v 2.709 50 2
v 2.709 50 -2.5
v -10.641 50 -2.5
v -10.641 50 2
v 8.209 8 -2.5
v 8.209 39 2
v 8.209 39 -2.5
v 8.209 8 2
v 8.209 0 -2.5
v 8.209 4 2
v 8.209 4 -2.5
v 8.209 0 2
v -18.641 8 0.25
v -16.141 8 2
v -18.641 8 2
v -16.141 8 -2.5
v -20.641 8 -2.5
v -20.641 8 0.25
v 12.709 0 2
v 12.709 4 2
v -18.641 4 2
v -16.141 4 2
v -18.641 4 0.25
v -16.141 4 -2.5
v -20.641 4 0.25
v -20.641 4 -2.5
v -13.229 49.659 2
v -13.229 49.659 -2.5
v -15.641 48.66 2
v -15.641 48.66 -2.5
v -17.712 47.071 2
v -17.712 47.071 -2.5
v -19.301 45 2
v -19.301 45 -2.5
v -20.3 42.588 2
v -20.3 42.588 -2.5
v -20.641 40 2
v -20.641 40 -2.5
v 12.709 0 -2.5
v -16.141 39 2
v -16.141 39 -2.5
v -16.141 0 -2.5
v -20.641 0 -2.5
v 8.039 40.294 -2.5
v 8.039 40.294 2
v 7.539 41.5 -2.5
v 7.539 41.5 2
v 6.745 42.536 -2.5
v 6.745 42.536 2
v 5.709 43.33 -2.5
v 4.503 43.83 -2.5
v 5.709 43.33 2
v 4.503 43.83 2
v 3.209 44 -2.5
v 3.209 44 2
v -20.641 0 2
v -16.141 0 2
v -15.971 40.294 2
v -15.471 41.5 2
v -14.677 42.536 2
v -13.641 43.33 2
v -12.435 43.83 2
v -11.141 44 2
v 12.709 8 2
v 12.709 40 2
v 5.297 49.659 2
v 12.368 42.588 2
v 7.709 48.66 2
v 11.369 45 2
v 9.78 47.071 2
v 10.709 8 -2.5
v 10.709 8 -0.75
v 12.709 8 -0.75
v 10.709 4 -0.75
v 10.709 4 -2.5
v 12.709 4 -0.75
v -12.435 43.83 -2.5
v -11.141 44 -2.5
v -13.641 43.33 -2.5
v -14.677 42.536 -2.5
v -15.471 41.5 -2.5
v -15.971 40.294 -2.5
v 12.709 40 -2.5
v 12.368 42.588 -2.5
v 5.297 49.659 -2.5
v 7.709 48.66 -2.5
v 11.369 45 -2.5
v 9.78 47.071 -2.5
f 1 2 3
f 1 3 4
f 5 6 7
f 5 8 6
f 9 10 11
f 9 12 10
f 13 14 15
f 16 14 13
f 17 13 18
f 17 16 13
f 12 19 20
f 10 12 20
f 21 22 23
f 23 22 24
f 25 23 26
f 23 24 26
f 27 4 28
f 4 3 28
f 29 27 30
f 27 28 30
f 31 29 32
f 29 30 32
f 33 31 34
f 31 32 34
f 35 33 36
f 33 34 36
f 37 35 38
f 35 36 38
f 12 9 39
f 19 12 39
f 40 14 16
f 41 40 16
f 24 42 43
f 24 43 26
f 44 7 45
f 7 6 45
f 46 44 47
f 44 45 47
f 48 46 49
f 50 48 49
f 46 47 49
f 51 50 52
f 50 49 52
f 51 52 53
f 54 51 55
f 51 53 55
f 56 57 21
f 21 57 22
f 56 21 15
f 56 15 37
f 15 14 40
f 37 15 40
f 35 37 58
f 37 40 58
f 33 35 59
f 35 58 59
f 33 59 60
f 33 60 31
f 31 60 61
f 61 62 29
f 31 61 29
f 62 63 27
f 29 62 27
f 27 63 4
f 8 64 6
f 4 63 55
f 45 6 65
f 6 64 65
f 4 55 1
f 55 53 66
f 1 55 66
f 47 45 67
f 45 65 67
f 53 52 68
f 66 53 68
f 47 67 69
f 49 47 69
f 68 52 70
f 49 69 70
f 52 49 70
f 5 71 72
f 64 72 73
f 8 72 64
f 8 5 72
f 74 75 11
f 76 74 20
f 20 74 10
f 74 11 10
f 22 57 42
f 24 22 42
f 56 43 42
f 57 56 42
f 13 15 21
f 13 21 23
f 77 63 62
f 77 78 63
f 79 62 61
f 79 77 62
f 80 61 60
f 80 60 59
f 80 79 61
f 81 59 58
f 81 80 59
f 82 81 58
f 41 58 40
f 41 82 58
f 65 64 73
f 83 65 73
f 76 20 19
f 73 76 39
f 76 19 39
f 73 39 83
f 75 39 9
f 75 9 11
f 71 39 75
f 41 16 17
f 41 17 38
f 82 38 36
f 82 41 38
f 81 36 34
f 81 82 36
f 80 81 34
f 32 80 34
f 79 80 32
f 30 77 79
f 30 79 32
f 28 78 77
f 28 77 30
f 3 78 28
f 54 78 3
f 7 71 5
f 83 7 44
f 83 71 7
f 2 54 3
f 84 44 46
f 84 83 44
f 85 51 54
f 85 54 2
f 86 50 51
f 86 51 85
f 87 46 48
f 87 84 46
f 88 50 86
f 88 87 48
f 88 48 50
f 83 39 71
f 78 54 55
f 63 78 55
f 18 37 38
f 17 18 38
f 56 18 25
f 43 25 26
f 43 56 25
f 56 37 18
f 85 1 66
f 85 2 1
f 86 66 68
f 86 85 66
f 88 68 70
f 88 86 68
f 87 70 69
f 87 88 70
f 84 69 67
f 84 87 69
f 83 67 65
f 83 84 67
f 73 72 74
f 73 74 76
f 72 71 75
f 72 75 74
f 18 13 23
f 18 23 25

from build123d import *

# Parameters (mm, degrees)
SKETCH1_W             = 4.5
SKETCH1_H             = 4.5
BOSS_EXTRUDE1_DEPTH   = 50
BOSS_EXTRUDE1_2_DEPTH = 50
SKETCH2_W             = 4.5
SKETCH2_H             = 6
BOSS_EXTRUDE2_DEPTH   = 25
FILLET1_R             = 10
FILLET2_R             = 5
SKETCH5_W             = 4.5
SKETCH5_H             = 4
CUT_EXTRUDE3_DEPTH    = 2.75
SKETCH6_W             = 4.5
SKETCH6_H             = 4
CUT_EXTRUDE4_DEPTH    = 2.75
SKETCH3_W             = 4.5
SKETCH3_H             = 4
CUT_EXTRUDE1_DEPTH    = 2.5
SKETCH4_W             = 4.5
SKETCH4_H             = 4
CUT_EXTRUDE2_DEPTH    = 2.5


with BuildPart() as part:
    # Sketch1 → Boss-Extrude1 (new body)
    with BuildSketch(Plane(origin=(0, 0, 0), x_dir=(1, 0, 0), z_dir=(0, 1, 0))):
        with Locations((-18.391025641, 0.25)):
            Rectangle(SKETCH1_W, SKETCH1_H)
    extrude(amount=BOSS_EXTRUDE1_DEPTH)



with BuildPart() as body_2:
    # Sketch1 → Boss-Extrude1 2 (new body)
    with BuildSketch(Plane(origin=(0, 0, 0), x_dir=(1, 0, 0), z_dir=(0, 1, 0))):
        with Locations((10.458974359, 0.25)):
            Rectangle(SKETCH1_W, SKETCH1_H)
    extrude(amount=BOSS_EXTRUDE1_2_DEPTH)


with BuildPart() as part_1:
    add(part.part)

    add(body_2.part)  # Boss-Extrude2 merges body 2
    # Sketch2 → Boss-Extrude2 (add)
    with BuildSketch(Plane.ZY.offset(-8.208974359)):
        with Locations((-0.25, 47)):
            Rectangle(SKETCH2_W, SKETCH2_H)
    extrude(amount=BOSS_EXTRUDE2_DEPTH)

    # Fillet1
    fillet1_edges = [part_1.edges().sort_by_distance(p)[0] for p in [
        (-20.641025641, 50, -0.25),
        (12.708974359, 50, -0.25),
    ]]
    fillet(fillet1_edges, radius=FILLET1_R)

    # Fillet2
    fillet2_edges = [part_1.edges().sort_by_distance(p)[0] for p in [
        (-16.141025641, 44, -0.25),
        (8.208974359, 44, -0.25),
    ]]
    fillet(fillet2_edges, radius=FILLET2_R)

    # Sketch5 → Cut-Extrude3 (cut)
    with BuildSketch(Plane.XY.offset(2)):
        with Locations((10.458974359, 6)):
            Rectangle(SKETCH5_W, SKETCH5_H)
    extrude(amount=-CUT_EXTRUDE3_DEPTH, mode=Mode.SUBTRACT)

    # Sketch6 → Cut-Extrude4 (cut)
    with BuildSketch(Plane(origin=(0, 0, -2.5), x_dir=(-1, 0, 0), z_dir=(0, 0, -1))):
        with Locations((18.391025641, 6)):
            Rectangle(SKETCH6_W, SKETCH6_H)
    extrude(amount=-CUT_EXTRUDE4_DEPTH, mode=Mode.SUBTRACT)

    # Sketch3 → Cut-Extrude1 (cut)
    with BuildSketch(Plane.ZY.offset(-8.208974359)):
        with Locations((-0.25, 6)):
            Rectangle(SKETCH3_W, SKETCH3_H)
    extrude(amount=-CUT_EXTRUDE1_DEPTH, mode=Mode.SUBTRACT)

    # Sketch4 → Cut-Extrude2 (cut)
    with BuildSketch(Plane(origin=(-16.141025641, 0, 0), x_dir=(0, 0, -1), z_dir=(1, 0, 0))):
        with Locations((0.25, 6)):
            Rectangle(SKETCH4_W, SKETCH4_H)
    extrude(amount=-CUT_EXTRUDE2_DEPTH, mode=Mode.SUBTRACT)


solid = part_1.part
